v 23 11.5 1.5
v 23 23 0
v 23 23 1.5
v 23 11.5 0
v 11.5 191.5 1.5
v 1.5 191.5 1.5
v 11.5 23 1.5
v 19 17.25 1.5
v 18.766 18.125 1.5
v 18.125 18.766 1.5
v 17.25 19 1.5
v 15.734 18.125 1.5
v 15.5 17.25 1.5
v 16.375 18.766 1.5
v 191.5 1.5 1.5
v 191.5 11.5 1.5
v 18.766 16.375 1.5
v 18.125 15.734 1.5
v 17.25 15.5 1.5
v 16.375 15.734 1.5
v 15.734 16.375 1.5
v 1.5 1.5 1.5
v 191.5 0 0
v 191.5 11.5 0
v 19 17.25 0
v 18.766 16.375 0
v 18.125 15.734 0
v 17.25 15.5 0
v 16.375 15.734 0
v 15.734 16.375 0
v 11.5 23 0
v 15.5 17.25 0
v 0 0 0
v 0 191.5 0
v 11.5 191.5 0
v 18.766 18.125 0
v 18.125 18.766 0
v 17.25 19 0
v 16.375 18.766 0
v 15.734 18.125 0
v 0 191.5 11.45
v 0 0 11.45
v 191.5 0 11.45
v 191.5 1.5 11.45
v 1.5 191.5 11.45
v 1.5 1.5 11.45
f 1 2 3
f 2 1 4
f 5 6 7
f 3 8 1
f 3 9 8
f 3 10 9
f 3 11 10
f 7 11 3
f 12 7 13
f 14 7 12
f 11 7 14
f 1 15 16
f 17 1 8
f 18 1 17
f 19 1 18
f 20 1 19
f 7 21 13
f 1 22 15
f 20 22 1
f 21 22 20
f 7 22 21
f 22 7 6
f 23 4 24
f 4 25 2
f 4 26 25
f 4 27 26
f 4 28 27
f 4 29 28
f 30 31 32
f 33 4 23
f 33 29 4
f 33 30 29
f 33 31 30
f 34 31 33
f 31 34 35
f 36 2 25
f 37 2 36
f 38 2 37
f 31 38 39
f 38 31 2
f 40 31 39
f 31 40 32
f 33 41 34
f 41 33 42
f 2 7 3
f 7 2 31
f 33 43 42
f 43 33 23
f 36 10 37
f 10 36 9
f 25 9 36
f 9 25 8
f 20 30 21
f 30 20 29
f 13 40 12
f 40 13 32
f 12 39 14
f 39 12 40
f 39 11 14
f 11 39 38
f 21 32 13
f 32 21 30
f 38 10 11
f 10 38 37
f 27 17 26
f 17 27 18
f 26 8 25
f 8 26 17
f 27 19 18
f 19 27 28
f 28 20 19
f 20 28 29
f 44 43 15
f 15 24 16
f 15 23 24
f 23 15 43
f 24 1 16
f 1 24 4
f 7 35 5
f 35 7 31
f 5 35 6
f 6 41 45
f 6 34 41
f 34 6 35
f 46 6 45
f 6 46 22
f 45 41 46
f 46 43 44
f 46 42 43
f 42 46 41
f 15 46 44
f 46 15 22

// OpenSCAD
boardWidth = 624;
boardHeight = 567;
boardThickness = 9.95;

frameWidth = 10;
frameThickness = 1.5;
hole = 3.5;

cornerSize = 190;

module dummy() {}

frameWidth1 = frameWidth + frameThickness;

module corner() {
    cube([cornerSize+frameThickness,frameWidth1,frameThickness]);
    cube([frameWidth1,cornerSize+frameThickness,frameThickness]);
    if (hole>0) {
        difference() {
            cube([frameWidth1*2,frameWidth1*2,frameThickness]);
            translate([frameWidth1*1.5,frameWidth1*1.5,-1])
            cylinder(d=hole,h=frameThickness+2,$fn=12);
        }
    }
    cube([frameThickness,cornerSize+frameThickness,boardThickness+frameThickness]);
    cube([cornerSize+frameThickness,frameThickness,boardThickness+frameThickness]);
}

module edge(boardSize) {
    cube([boardSize-2*cornerSize,frameWidth1,frameThickness]);
    cube([boardSize-2*cornerSize,frameThickness,boardThickness+frameThickness]);
}

//translate([frameWidth1+2,185,0]) rotate([0,0,-45]) edge(boardWidth);

//translate([frameWidth1+40,180,0]) rotate([0,0,-45]) edge(boardHeight);


render(convexity=2) corner();
